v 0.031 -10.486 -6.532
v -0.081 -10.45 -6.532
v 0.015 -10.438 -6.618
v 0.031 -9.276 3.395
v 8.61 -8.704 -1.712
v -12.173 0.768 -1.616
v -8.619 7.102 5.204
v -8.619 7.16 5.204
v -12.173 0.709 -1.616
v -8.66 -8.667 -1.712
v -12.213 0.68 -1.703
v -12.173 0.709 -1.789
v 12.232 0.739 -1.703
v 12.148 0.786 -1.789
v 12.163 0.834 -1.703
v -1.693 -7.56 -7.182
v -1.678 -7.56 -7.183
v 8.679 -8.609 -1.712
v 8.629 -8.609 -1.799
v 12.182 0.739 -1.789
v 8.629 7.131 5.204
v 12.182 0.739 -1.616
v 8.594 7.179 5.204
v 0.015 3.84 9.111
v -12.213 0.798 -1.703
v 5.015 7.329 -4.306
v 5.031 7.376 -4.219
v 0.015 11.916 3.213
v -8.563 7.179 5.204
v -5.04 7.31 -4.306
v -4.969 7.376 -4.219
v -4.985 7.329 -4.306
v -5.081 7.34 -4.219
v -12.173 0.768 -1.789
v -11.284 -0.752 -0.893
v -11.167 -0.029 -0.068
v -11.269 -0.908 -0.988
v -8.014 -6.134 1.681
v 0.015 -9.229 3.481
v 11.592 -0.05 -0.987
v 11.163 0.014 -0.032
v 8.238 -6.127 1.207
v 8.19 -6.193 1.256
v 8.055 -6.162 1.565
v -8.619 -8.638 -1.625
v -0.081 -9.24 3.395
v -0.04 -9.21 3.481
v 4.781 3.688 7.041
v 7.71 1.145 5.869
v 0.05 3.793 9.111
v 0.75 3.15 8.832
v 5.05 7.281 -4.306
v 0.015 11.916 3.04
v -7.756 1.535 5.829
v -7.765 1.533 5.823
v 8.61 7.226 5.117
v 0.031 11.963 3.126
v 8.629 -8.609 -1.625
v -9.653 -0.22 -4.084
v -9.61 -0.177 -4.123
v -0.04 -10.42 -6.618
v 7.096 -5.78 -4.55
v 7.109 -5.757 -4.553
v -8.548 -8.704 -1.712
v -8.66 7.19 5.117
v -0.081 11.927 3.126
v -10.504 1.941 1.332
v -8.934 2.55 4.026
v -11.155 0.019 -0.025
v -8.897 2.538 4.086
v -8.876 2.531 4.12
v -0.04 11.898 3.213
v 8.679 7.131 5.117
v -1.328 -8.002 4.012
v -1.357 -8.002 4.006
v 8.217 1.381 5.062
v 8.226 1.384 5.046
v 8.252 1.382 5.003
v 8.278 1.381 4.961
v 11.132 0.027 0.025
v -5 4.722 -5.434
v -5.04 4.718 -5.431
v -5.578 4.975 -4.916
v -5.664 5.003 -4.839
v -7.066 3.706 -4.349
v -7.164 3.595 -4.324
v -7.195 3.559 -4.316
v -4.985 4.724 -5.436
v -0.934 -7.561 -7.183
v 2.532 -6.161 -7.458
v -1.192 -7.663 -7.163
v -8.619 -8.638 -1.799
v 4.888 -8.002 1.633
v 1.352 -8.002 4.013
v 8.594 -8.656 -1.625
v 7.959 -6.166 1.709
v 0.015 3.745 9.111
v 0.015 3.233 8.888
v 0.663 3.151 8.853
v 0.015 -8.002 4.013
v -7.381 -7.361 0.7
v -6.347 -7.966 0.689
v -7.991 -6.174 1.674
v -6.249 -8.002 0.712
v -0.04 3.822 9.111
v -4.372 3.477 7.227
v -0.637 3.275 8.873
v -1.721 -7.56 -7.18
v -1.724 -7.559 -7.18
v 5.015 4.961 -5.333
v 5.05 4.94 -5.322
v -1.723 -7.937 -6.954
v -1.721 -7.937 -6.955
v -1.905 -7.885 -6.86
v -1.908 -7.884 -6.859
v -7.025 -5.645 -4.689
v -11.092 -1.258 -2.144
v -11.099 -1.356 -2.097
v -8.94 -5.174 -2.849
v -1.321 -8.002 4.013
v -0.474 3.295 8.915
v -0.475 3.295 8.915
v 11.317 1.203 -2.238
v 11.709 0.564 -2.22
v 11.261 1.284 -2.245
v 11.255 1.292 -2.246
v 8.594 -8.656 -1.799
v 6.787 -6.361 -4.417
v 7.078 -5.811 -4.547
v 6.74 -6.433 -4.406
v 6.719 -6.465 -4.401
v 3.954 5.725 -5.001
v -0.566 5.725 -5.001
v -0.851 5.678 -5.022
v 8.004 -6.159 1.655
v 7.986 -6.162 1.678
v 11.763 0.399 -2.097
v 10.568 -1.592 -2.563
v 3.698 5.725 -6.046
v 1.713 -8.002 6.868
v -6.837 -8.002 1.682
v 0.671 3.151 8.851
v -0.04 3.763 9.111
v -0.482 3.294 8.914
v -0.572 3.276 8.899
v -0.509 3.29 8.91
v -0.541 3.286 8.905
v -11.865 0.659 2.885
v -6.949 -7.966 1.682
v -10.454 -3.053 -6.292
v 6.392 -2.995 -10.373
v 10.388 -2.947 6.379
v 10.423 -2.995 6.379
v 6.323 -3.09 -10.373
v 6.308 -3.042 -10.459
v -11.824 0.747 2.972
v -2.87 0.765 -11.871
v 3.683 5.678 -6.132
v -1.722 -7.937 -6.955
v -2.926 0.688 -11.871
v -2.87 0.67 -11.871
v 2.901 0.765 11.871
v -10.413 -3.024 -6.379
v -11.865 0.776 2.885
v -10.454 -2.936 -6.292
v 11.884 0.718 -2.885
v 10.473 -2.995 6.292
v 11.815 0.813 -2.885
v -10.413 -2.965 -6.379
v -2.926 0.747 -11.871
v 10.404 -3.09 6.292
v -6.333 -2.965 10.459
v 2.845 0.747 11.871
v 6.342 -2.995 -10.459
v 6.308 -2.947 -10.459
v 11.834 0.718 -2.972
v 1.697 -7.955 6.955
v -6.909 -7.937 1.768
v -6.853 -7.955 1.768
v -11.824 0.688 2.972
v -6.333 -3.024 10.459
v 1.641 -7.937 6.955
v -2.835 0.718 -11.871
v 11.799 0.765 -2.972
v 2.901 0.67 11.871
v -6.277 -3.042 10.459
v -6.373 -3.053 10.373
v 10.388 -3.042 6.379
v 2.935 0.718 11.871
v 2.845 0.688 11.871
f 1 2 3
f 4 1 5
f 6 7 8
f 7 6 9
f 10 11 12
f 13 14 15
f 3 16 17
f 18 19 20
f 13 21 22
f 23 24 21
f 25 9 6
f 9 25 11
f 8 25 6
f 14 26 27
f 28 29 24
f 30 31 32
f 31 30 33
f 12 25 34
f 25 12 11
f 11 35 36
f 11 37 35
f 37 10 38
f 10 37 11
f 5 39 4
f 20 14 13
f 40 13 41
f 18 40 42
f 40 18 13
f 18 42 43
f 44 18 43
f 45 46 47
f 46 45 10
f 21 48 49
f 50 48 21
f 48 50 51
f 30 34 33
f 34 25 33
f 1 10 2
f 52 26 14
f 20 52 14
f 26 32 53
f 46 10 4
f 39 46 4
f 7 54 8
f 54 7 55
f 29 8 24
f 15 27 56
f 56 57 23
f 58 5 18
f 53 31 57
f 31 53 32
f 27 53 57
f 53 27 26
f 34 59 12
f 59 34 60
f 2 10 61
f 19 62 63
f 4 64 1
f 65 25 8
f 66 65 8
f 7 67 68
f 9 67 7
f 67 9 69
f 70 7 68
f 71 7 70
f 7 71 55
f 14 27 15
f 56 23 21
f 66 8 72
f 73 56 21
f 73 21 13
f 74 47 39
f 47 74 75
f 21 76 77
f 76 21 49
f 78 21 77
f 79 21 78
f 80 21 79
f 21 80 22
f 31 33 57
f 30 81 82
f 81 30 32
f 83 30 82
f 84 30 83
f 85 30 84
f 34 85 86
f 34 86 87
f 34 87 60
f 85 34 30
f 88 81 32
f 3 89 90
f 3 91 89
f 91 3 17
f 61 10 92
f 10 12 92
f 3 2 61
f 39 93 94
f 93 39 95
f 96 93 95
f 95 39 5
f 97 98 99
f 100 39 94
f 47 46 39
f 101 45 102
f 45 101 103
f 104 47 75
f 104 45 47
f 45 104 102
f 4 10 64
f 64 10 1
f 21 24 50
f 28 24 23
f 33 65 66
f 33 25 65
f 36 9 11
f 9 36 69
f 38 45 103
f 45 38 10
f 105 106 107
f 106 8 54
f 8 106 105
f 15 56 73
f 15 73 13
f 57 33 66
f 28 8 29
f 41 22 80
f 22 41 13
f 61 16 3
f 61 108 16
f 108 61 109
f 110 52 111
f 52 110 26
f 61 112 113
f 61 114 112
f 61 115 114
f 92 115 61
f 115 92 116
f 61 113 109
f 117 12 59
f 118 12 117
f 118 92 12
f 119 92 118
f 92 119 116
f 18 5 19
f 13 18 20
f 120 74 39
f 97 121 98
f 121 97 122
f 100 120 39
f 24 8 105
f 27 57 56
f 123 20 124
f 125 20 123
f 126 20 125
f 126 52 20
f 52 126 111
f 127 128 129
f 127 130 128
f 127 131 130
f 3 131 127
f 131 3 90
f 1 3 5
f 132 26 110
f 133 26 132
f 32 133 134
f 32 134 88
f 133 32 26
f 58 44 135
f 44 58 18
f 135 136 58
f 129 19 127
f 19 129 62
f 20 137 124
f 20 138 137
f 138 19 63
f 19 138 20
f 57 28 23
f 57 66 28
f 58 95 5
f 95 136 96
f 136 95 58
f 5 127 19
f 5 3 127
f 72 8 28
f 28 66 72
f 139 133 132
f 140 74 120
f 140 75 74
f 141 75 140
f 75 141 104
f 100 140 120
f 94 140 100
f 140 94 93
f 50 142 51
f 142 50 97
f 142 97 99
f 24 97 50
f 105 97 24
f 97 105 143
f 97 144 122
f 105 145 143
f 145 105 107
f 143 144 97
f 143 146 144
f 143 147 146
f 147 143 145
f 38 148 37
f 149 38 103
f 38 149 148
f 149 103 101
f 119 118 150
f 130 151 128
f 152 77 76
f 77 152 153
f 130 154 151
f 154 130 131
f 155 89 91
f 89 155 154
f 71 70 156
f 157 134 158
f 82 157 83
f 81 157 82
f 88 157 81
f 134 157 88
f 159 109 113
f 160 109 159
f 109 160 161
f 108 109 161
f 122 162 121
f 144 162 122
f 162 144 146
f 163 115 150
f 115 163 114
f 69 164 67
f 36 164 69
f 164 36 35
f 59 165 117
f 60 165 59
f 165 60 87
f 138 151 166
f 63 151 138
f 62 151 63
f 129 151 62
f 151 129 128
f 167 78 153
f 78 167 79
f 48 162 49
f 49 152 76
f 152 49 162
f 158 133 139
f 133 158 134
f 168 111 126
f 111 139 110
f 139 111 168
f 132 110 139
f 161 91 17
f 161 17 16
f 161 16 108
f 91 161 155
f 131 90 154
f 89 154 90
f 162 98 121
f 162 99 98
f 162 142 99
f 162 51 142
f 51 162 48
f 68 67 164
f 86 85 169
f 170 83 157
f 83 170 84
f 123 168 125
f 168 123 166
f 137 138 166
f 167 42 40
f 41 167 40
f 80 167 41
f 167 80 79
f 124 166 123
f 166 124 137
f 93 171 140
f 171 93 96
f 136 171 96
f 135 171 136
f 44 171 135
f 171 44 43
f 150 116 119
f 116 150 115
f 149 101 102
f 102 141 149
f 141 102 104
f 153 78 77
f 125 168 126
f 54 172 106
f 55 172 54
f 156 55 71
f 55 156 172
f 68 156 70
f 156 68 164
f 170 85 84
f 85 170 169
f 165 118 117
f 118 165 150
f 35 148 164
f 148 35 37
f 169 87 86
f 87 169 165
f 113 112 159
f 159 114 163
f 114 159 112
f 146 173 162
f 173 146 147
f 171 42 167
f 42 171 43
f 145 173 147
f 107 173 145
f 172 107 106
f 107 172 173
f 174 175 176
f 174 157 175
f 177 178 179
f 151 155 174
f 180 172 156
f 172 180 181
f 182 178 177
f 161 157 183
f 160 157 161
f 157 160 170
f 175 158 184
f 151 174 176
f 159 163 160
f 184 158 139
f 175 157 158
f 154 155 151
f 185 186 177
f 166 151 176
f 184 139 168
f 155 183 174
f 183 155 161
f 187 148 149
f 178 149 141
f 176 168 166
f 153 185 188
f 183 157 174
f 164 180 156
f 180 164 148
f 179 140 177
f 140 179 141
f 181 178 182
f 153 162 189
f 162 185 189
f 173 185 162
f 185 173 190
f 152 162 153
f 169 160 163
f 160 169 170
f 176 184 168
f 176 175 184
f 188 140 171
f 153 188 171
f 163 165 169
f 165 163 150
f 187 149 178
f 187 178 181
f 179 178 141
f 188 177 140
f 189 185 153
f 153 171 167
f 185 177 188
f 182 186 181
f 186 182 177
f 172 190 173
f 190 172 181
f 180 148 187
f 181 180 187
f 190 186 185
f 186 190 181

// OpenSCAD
// Auto-generated OpenSCAD file

    inner_points = 10*[[-0.2885376862918134, 0.07175899174657377, -1.1783945441115085], [0.28853768640082145, 0.07175900040332306, 1.1783945428274933], [-1.1783945434149965, 0.0717589960423746, 0.28853768570430977], [1.1783945435240049, 0.07175899610752223, -0.28853768698832505], [-1.037277726864703, -0.29945504957306746, -0.6292238173151442], [0.6292238183363167, -0.2994550495270012, -1.0372777266018605], [-0.6292238175779867, -0.29945504345182133, 1.0372777278858758], [1.037277727623033, -0.299455043405755, 0.6292238185991594], [-0.16817179443109592, -0.7907165367613447, -0.6868174750759801], [0.16817179604873278, -0.7907165317158302, 0.6868174797585049], [-0.686817476608424, -0.7907165342575728, 0.16817179758117676], [0.6868174782260609, -0.7907165342196021, -0.16817179289865195], [-0.6045687129127788, 0.5630204820268412, -0.366737881241974], [0.36673787852556217, 0.5630204820536906, -0.604568714878892], [-0.366737879275861, 0.5630204855945586, 0.6045687101963672], [0.6045687121624802, 0.563020485621408, 0.3667378765594492]];

    outer_points = 10*[[-1.213205545812953, 0.07387883237032282, -0.17027003437574006], [1.2132055459196738, 0.07387883237032282, -0.17027003361533383], [-9.797521174090613e-11, 1.186835379548445, 0.3126330832175659], [2.0469611576138433e-10, -1.0390777148077994, -0.6531731512086397], [-0.8578658686155681, 0.7131002893052931, 0.5117341025641999], [-0.8578658684015472, -0.8608579540459387, -0.17119403511081444], [0.8578658682948263, 0.7131002893052931, 0.5117341031018883], [0.8578658685088472, -0.8608579540459387, -0.17119403457312604], [-0.7071067813811416, -0.2694200616443975, 0.6209378460253994], [0.7071067809919536, -0.2694200616443975, 0.6209378464685957], [-2.827987185956705e-10, 0.3792574228569266, 0.9023939193757089], [-1.0638924793604034e-10, -0.9180975461457217, 0.33948177311828626], [-0.49999999986777616, 0.7281043097383153, -0.42191834848824256], [-0.49999999974303583, -0.1892641864495203, -0.8199573443191398], [0.5000000001322238, 0.7281043097383153, -0.42191834817485535], [0.5000000002569641, -0.1892641864495203, -0.8199573440057525]];

    // Convex hull for inner set (I)
    module inner_hull() {
        hull() {
            for (p = inner_points) {
                translate(p) sphere(r=0.1);
            }
        }
    }

    // Convex hull for outer set (O) minus inner hull (O \ I)
    module outer_minus_inner() {
        difference() {
            hull() {
                for (p = outer_points) {
                    translate(p) sphere(r=0.1);
                }
            }
            inner_hull(); // Subtract inner hull
        }
    }

    // Convex hull for outer set (O) minus all translated inner hulls
    module outer_minus_AllTranslationInner() {
        difference() {
            hull() {
                for (p = outer_points) {
                    translate(p) sphere(r=0.1);
                }
            }
            hull() {
                translate([0,0,50]) inner_hull();
                translate([0,0,-50]) inner_hull();
            }; // Subtract translated inner hulls
        }
    }

    // Difference between outer_minus_inner and outer_minus_AllTranslationInner
    module outer_minus_inner_diff() {
        difference() {
            // Outer minus inner
            difference() {
                hull() {
                    for (p = outer_points) {
                        translate(p) sphere(r=0.1);
                    }
                }
                inner_hull();
            }

            // Subtract Outer minus AllTranslationInner
            difference() {
                hull() {
                    for (p = outer_points) {
                        translate(p) sphere(r=0.1);
                    }
                }
                hull() {
                    translate([0,0,50]) inner_hull();
                    translate([0,0,-50]) inner_hull();
                };
            }
        }
    }

    // Rendering all with colors applied
    color([1, 0, 0, 0.5]) inner_hull(); // Transparent red
    color([0, 1, 0, 1]) outer_minus_AllTranslationInner(); // Opaque green
    color([1, 1, 0, 1]) outer_minus_inner_diff(); // Opaque yellow
    
